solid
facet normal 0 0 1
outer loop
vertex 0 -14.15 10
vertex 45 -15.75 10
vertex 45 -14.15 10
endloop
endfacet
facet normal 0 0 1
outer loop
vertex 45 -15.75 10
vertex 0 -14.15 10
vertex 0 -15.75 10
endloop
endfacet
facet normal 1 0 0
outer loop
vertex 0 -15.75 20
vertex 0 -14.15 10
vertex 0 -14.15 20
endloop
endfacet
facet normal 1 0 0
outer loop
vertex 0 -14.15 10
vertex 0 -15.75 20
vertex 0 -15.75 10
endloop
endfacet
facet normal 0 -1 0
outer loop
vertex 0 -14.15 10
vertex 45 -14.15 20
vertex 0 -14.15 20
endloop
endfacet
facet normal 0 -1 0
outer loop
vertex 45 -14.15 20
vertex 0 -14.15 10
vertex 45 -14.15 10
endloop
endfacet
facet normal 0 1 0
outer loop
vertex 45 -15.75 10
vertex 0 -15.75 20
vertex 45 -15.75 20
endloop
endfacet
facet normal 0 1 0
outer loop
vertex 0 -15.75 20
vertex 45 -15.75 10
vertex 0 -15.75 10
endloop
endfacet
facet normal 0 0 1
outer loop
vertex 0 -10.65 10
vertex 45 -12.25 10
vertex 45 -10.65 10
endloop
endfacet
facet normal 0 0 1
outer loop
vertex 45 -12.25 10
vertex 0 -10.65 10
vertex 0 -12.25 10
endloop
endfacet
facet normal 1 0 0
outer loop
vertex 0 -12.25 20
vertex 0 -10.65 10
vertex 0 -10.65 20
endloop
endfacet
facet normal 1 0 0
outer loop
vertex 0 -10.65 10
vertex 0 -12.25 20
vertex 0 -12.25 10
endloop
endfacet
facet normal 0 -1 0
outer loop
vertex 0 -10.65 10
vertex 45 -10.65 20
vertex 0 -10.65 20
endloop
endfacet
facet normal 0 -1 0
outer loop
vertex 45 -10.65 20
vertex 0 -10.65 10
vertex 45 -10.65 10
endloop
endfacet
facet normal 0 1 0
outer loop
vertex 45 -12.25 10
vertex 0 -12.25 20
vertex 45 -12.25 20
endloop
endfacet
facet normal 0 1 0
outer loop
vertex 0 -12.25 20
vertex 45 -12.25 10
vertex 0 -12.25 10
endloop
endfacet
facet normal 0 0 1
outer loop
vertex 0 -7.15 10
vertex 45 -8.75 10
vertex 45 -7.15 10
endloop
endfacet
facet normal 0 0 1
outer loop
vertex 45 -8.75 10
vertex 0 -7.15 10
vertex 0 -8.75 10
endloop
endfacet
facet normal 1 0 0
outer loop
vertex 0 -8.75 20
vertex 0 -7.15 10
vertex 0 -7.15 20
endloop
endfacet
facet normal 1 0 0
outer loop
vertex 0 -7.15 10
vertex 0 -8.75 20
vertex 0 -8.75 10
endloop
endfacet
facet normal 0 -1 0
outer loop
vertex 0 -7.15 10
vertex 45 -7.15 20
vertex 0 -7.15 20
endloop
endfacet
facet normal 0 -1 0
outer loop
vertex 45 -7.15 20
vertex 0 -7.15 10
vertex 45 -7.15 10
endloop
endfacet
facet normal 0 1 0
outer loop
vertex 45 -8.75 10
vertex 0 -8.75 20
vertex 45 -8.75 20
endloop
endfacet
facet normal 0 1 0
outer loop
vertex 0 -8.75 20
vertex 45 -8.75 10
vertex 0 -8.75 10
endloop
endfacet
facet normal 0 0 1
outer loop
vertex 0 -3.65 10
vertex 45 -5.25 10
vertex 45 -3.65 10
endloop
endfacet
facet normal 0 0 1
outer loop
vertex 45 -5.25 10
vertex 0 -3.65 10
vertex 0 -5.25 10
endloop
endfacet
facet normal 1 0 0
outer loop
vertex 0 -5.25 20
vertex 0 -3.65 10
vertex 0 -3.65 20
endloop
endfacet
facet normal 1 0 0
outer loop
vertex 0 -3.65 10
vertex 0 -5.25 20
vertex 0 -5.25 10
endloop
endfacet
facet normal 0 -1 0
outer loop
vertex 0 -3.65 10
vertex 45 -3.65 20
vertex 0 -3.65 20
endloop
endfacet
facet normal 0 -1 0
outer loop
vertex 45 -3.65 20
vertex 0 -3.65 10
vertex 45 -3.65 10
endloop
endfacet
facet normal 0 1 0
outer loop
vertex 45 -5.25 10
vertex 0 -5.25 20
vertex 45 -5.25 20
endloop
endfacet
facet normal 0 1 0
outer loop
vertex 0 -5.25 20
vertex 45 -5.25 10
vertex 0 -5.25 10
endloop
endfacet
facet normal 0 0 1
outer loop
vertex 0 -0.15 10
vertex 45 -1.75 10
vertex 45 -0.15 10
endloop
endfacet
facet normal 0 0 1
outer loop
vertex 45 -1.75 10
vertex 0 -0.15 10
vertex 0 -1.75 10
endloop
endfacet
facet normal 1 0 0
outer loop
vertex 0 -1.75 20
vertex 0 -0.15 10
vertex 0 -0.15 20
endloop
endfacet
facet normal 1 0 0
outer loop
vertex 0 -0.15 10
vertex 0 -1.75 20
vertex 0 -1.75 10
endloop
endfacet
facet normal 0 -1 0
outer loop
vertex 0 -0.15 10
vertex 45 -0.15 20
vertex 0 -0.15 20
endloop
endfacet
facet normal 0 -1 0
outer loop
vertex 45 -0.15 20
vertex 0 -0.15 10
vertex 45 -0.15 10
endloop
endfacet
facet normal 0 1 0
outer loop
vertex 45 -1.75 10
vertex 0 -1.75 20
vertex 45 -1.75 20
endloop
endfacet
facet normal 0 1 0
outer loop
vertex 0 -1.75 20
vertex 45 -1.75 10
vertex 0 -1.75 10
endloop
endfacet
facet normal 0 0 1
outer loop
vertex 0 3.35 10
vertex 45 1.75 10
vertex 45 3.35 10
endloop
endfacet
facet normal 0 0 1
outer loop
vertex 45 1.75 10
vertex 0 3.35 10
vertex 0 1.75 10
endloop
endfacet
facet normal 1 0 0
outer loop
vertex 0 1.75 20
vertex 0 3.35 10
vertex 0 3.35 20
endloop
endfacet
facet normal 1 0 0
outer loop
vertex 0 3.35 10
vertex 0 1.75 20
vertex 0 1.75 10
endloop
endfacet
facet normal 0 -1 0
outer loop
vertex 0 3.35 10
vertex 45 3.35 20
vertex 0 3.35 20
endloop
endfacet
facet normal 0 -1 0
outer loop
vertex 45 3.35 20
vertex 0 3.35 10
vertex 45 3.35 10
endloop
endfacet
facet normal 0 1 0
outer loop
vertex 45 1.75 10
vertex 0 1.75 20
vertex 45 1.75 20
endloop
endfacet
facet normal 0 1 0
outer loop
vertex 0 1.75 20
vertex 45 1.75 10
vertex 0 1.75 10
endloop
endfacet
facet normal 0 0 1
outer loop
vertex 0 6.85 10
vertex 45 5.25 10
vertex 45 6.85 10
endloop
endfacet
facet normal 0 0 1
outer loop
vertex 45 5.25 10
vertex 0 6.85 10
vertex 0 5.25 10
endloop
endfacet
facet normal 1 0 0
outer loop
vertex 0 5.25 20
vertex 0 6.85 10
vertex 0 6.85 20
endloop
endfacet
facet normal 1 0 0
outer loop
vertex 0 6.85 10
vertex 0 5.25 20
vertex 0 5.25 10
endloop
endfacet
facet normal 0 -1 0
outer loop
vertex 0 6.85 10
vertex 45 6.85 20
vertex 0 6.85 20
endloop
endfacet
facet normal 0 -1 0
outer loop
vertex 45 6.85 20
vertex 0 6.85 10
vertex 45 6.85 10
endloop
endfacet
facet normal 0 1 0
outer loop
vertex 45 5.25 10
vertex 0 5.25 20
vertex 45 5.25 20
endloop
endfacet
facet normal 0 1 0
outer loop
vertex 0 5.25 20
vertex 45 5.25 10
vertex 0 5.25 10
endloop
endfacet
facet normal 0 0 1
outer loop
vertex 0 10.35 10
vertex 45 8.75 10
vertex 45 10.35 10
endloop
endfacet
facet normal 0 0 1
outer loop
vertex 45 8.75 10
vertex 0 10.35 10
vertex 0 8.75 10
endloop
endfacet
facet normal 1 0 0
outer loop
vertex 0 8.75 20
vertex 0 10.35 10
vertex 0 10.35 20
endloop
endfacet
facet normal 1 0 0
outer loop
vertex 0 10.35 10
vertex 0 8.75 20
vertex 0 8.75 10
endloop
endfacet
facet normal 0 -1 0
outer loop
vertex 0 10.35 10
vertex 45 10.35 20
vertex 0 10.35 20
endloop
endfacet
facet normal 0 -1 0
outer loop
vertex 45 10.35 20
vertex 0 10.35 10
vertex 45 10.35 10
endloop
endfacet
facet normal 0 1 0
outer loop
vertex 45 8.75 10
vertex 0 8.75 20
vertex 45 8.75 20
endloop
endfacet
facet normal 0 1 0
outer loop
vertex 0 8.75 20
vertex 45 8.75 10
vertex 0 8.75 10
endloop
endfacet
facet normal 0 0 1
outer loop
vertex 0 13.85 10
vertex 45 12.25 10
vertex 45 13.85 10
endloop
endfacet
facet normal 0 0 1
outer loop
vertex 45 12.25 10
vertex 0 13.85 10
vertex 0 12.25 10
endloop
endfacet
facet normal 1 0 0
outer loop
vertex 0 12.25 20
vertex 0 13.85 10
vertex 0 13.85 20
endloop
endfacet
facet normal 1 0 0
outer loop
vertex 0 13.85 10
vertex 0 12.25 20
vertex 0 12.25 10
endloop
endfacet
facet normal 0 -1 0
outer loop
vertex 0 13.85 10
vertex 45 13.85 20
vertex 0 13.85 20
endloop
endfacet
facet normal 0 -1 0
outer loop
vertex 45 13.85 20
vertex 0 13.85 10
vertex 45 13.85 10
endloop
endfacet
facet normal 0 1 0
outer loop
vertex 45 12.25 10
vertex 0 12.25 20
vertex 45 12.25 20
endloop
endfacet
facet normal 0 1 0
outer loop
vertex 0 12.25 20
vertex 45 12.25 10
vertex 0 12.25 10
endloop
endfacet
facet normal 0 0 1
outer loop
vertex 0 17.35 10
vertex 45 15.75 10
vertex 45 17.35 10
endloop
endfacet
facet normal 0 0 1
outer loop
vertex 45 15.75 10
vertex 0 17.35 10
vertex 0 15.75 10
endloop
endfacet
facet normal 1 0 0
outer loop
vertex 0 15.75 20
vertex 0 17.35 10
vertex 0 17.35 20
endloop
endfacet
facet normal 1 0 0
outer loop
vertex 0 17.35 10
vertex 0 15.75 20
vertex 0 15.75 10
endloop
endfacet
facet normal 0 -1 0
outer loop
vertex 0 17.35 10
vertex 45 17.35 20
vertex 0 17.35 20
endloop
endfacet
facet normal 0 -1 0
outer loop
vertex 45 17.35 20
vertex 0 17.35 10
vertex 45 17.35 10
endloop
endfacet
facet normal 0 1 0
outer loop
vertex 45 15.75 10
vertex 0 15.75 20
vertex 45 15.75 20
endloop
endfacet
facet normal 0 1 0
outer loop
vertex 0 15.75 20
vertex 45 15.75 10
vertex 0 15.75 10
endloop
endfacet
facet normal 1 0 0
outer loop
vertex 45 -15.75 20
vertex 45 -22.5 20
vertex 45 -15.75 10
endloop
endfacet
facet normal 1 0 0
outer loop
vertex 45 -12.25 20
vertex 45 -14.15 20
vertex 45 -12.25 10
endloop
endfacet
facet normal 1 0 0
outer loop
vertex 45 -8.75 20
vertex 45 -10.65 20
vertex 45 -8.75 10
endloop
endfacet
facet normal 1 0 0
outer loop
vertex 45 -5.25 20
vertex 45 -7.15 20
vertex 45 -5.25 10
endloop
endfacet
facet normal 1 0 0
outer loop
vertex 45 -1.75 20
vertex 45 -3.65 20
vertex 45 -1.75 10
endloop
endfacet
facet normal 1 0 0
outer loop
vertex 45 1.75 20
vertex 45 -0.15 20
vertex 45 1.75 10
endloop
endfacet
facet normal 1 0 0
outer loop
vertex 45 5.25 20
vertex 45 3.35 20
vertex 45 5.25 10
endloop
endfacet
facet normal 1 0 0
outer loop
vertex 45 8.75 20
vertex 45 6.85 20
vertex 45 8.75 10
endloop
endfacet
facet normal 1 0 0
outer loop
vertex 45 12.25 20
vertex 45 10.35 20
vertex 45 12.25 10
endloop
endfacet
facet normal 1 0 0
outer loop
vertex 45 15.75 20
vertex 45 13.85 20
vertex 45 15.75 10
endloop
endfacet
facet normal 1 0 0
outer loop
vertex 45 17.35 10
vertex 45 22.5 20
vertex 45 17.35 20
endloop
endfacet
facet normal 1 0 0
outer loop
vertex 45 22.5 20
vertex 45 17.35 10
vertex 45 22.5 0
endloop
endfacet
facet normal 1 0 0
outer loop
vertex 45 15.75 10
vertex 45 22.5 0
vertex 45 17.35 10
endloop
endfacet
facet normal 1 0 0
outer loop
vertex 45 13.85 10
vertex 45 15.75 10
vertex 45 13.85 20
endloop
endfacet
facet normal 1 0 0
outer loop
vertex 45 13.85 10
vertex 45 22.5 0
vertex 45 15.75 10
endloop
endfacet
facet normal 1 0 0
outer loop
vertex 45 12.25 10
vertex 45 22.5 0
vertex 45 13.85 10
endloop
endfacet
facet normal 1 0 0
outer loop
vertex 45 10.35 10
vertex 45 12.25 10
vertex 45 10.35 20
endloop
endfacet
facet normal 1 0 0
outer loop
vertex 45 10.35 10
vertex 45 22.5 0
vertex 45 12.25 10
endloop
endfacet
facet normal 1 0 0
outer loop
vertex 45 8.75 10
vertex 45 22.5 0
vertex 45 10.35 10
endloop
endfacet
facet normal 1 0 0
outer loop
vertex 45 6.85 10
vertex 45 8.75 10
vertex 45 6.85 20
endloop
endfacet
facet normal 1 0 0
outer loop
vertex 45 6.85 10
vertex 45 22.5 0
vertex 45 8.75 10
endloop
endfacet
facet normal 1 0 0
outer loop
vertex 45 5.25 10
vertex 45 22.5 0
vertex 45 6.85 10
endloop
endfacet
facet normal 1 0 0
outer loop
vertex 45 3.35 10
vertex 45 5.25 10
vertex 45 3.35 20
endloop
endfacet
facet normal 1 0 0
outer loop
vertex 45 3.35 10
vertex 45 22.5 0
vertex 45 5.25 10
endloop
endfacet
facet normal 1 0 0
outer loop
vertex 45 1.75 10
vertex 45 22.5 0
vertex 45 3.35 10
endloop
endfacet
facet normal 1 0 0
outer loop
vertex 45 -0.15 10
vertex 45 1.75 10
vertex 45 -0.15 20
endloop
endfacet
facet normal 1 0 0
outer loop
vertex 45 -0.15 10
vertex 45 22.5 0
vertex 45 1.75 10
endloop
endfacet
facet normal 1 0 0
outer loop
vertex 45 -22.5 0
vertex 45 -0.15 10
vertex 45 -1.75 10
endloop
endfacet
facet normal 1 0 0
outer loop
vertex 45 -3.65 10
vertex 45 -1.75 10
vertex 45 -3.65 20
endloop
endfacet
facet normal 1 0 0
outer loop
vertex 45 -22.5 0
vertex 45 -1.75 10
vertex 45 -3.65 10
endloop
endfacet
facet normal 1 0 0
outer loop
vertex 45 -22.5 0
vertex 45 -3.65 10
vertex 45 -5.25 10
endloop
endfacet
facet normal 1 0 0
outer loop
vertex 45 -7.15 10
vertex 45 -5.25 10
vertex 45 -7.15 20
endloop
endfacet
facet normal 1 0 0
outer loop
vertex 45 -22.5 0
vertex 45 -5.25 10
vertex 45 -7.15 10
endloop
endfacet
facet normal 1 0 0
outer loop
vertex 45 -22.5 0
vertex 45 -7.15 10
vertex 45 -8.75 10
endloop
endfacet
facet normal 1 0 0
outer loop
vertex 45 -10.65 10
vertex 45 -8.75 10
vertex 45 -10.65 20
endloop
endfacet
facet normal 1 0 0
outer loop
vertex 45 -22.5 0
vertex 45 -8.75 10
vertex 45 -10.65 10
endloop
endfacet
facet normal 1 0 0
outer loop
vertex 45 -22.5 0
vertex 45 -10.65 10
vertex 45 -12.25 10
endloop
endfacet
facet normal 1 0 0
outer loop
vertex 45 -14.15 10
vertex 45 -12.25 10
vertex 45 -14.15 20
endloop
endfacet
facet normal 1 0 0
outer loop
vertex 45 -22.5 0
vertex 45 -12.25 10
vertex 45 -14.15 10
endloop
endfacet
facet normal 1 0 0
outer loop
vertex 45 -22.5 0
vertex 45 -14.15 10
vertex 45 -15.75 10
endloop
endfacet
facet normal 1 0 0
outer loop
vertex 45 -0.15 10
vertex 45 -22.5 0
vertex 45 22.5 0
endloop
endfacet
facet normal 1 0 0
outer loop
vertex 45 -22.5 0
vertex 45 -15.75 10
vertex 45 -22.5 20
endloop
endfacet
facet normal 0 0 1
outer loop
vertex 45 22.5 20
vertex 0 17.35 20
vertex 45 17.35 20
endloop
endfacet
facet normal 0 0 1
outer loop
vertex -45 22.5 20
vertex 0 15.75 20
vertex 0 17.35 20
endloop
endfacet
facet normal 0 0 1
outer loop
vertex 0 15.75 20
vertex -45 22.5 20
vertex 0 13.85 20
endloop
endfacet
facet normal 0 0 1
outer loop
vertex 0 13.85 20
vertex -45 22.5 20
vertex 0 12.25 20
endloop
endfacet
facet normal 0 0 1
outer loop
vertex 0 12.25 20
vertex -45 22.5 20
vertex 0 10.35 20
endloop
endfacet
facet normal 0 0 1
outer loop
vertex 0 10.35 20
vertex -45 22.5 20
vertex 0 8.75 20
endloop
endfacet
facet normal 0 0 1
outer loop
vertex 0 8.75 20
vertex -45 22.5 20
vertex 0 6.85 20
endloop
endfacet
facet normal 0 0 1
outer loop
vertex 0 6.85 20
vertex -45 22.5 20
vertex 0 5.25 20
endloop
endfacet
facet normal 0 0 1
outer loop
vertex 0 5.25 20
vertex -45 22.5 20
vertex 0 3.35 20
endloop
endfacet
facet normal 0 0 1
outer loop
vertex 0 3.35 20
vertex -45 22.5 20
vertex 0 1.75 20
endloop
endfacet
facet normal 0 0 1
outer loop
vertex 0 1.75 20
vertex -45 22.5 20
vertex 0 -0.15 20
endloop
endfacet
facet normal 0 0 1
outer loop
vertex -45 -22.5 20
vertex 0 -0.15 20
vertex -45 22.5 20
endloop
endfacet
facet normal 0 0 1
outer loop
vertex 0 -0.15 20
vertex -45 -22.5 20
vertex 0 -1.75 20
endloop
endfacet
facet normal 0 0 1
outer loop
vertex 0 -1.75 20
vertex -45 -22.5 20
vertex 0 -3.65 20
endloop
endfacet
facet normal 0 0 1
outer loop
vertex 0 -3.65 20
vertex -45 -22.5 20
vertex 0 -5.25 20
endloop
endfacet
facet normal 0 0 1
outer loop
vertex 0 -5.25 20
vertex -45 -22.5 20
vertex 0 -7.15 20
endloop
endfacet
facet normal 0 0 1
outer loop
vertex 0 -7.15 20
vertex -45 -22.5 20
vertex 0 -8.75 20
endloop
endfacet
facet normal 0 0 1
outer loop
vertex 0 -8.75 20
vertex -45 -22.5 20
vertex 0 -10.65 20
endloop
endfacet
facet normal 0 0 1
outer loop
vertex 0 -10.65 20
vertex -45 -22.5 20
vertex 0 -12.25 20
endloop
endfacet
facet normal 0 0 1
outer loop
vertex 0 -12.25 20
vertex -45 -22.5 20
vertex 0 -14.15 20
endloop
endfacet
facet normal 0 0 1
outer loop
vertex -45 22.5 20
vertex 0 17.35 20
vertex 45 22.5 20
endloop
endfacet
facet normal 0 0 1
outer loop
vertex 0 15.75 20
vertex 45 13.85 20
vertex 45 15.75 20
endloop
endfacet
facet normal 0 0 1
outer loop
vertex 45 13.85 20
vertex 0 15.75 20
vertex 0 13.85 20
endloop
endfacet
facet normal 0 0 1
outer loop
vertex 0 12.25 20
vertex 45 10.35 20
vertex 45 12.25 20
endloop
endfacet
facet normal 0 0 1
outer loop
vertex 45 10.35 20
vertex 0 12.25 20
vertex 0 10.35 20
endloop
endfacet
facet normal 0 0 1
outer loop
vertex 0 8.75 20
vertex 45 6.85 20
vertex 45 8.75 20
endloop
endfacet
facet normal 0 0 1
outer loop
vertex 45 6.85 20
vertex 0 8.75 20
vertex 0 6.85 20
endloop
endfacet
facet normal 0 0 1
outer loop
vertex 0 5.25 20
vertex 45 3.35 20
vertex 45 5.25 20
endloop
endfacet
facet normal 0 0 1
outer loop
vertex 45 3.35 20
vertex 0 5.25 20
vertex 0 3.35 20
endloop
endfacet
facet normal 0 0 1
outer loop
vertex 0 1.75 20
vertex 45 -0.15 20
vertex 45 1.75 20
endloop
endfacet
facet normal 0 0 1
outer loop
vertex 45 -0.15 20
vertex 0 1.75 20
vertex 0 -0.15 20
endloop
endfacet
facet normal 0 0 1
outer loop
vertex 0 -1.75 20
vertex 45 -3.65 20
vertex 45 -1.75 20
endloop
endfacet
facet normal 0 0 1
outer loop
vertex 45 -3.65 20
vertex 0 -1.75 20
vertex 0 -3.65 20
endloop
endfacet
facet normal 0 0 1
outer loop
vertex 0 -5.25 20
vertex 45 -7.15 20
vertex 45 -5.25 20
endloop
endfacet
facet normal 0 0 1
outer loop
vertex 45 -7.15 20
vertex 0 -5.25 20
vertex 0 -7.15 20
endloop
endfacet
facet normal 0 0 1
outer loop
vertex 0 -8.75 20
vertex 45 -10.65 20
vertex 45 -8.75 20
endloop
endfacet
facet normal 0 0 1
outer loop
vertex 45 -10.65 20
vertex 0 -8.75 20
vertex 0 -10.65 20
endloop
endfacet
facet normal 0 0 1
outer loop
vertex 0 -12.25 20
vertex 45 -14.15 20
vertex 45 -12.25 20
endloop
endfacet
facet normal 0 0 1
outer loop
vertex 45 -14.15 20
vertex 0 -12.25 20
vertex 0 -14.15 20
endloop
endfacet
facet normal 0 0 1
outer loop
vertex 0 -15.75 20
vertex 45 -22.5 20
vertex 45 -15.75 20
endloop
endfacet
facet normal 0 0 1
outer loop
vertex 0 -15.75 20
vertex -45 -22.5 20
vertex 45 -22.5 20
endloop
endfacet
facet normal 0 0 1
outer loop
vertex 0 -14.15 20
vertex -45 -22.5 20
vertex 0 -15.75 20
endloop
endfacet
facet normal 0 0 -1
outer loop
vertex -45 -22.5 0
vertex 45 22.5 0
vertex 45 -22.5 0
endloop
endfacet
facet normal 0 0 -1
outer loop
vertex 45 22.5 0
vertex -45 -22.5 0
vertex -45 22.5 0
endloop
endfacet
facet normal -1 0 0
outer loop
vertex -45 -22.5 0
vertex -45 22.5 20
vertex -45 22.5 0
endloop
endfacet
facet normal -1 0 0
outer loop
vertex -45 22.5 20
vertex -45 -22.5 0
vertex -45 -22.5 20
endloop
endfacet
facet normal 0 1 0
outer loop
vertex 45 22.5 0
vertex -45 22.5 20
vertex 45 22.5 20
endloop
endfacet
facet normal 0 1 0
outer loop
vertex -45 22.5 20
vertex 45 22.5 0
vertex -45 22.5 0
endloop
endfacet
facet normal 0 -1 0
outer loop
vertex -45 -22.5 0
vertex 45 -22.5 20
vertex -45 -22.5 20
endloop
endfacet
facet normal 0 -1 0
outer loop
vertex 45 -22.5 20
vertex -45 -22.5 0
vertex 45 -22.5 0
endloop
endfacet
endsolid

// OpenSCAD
// Slide drying rack - holds 10 microscope slides standing on their long edge
// Units: mm. Print orientation: base on XY plane, slots open upward (+Z).

// ---------------- Parameters ----------------
block_len    = 90;    // block length along X
block_wid    = 45;    // block width along Y
block_ht     = 20;    // block height along Z

slot_count   = 10;    // number of slide slots
slot_len     = 77;    // slot length along X (slide + clearance)
slot_wid     = 1.6;   // slot width along Y
slot_depth   = 10;    // slot depth from top face (along -Z)
slot_pitch   = 3.5;   // centre-to-centre slot spacing along Y

eps          = 0.5;   // overshoot so cutters pass the top face cleanly

$fn = 64;

// ---------------- Derived ----------------
first_y = -(slot_count - 1) * slot_pitch / 2;  // y of first slot (group centred)

// ---------------- Model ----------------
difference() {
    // Main block, centred in X/Y, resting on z = 0
    translate([-block_len / 2, -block_wid / 2, 0])
        cube([block_len, block_wid, block_ht]);

    // Parallel slots running along X, open at the top
    for (i = [0 : slot_count - 1]) {
        translate([0, first_y + i * slot_pitch, block_ht - slot_depth])
            cube([slot_len, slot_wid, slot_depth + eps]);
    }
}
